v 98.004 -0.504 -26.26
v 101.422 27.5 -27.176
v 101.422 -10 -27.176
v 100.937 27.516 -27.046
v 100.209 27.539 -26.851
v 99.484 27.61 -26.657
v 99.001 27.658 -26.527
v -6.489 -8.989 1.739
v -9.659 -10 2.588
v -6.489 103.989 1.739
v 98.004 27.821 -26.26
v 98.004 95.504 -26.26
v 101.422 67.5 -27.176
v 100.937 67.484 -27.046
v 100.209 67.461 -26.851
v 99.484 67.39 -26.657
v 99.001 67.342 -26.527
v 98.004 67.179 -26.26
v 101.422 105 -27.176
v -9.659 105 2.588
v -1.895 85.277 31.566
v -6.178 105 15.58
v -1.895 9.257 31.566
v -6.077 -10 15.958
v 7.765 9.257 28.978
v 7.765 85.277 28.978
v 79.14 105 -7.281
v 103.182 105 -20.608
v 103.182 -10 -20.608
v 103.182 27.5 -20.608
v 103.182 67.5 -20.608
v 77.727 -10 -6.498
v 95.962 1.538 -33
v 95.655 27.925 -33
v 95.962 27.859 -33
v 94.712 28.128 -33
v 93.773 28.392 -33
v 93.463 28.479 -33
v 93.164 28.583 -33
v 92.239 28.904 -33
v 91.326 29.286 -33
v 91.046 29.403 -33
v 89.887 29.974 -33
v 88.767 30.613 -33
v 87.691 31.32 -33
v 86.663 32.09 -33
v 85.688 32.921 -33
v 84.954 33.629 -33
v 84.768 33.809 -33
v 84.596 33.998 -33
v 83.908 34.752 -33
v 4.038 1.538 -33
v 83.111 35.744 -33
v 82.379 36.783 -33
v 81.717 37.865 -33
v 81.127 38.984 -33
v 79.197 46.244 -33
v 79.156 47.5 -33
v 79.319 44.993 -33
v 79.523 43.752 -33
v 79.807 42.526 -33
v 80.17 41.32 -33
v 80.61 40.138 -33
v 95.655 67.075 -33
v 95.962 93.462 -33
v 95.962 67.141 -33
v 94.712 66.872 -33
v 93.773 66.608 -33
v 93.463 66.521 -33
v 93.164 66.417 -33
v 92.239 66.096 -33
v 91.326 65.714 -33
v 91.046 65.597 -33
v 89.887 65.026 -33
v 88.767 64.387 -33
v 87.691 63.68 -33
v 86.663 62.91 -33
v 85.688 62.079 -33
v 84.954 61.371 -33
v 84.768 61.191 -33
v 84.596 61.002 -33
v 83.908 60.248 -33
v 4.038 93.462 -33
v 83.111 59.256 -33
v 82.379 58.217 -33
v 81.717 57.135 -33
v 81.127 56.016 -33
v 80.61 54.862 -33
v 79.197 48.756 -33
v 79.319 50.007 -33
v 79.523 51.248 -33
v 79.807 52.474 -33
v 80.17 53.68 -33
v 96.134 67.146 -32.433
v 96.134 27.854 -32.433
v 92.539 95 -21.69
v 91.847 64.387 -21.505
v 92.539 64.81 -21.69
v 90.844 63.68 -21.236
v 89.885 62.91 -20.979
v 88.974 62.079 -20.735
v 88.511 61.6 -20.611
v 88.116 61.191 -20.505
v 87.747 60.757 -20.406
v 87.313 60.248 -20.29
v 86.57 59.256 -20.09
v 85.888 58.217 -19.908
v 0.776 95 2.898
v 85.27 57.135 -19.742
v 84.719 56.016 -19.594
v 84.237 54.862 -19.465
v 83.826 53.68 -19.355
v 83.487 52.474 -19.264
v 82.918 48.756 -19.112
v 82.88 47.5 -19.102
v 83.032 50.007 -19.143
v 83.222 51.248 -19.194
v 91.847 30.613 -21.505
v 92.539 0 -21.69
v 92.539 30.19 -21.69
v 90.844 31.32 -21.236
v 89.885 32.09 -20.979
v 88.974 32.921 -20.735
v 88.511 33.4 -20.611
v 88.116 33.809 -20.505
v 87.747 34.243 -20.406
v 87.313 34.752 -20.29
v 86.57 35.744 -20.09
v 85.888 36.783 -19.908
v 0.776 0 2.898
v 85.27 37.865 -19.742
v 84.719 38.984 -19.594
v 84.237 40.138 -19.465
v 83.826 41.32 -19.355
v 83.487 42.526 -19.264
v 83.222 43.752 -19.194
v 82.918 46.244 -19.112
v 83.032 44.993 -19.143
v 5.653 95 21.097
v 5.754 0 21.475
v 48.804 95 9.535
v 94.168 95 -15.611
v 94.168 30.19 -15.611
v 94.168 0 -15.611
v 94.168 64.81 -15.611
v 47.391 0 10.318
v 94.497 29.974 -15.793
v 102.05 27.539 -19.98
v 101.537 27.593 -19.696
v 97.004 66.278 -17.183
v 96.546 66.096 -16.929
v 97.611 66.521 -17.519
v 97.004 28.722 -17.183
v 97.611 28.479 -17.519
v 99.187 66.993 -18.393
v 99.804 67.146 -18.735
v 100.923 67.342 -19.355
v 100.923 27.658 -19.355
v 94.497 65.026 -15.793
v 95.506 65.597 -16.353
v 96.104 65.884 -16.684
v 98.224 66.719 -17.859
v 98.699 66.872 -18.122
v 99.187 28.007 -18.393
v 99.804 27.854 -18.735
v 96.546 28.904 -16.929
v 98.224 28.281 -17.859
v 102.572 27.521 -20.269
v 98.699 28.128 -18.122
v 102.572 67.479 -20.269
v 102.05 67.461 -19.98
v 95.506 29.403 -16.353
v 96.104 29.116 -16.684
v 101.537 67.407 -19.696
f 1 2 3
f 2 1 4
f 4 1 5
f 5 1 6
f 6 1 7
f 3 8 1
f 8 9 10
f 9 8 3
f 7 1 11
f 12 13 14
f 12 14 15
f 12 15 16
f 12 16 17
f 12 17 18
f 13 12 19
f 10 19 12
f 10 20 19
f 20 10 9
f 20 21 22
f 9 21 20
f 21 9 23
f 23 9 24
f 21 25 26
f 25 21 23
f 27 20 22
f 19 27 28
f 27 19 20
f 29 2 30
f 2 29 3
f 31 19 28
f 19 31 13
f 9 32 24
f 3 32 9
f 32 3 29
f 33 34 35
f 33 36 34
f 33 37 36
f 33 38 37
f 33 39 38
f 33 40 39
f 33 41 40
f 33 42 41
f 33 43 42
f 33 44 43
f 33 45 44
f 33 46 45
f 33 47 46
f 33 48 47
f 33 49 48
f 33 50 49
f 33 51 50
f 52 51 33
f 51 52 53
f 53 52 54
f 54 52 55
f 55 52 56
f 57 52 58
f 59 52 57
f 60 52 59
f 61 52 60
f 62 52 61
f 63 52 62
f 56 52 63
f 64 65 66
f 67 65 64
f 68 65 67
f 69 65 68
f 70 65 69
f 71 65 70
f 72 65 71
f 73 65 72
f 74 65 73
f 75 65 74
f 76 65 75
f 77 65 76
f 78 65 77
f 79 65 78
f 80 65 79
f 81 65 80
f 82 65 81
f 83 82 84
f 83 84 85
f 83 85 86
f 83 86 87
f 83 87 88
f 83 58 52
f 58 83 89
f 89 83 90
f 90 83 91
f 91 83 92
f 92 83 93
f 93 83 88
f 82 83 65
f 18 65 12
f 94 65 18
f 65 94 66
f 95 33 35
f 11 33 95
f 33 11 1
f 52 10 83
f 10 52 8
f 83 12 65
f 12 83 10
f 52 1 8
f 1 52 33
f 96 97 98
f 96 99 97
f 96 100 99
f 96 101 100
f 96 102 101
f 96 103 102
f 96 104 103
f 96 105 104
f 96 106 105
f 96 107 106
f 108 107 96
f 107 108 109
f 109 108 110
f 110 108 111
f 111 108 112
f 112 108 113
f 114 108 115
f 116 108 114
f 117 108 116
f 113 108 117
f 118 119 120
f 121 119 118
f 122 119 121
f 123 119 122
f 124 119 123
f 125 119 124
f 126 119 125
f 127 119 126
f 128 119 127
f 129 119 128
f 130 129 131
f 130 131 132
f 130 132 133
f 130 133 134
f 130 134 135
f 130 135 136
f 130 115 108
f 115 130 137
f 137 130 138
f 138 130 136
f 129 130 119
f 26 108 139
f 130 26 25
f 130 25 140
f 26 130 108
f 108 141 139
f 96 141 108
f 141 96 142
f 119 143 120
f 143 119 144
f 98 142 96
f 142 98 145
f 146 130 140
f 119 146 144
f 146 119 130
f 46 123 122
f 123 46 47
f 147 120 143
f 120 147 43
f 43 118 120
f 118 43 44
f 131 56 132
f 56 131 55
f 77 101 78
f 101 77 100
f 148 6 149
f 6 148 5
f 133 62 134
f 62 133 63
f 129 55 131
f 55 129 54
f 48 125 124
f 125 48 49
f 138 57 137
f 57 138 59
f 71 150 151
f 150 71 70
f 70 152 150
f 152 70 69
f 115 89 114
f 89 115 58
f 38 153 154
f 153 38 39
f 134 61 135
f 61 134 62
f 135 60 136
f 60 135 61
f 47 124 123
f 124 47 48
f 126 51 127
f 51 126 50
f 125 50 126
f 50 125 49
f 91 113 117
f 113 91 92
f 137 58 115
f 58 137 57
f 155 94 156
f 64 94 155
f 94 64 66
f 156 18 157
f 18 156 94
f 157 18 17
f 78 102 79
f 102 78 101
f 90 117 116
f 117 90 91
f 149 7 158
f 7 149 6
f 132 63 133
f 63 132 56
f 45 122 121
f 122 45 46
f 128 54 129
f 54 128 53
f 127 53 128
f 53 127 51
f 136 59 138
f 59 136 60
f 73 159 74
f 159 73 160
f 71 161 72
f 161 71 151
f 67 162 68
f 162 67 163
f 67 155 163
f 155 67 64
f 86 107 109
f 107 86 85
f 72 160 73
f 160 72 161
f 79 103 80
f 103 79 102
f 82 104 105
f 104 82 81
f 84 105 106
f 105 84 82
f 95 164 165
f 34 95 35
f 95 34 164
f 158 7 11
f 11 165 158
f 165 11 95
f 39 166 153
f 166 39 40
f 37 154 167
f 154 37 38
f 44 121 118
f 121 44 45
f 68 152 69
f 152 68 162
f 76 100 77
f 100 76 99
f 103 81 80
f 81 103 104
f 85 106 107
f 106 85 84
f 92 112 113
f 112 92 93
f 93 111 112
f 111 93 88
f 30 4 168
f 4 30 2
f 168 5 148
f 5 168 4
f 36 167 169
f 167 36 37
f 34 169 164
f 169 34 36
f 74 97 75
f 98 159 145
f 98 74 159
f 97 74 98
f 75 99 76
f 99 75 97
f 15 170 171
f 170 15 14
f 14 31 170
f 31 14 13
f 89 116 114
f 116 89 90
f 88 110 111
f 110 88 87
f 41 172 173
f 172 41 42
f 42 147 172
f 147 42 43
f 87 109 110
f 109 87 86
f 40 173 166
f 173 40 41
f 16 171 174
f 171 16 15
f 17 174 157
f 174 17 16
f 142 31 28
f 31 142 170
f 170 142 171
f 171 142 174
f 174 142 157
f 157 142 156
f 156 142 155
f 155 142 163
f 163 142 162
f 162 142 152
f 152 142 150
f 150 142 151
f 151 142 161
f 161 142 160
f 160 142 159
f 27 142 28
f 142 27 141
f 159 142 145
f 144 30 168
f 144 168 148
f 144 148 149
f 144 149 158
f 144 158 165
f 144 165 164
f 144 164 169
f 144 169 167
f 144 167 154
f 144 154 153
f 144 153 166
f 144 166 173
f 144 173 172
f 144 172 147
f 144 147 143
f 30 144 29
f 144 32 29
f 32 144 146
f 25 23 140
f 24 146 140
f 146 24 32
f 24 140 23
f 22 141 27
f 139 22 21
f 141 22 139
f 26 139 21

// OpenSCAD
difference(){
    union() {
        rotate([0,15,0]) translate([-10,-10,0]) linear_extrude(30) square([115,115]);
        translate([50,47.5,2]) rotate([0,180,45]) cylinder(35,80,65,$fn=4);
    }
    // メモスペース
    rotate([0,15,0]) translate([0,0,3]) linear_extrude(50) square([95,95]);
    // 指めくり
    rotate([0,15,0]) translate([105,47.5,-20]) linear_extrude(50) circle(20,$fn=100);
    // 斜めカット
    rotate([0,29,0]) translate([-10,-20,32]) linear_extrude(50) square([150,150]);
    // 飾り
    translate([-20,-35,25]) rotate([0,15,0]) rotate([40,0,0]) rotate([0,90,0]) linear_extrude(200) square([20,50]);
    translate([-20,95,55]) rotate([0,15,0]) rotate([-40,0,0]) rotate([0,90,0]) linear_extrude(200) square([20,50]);
}
